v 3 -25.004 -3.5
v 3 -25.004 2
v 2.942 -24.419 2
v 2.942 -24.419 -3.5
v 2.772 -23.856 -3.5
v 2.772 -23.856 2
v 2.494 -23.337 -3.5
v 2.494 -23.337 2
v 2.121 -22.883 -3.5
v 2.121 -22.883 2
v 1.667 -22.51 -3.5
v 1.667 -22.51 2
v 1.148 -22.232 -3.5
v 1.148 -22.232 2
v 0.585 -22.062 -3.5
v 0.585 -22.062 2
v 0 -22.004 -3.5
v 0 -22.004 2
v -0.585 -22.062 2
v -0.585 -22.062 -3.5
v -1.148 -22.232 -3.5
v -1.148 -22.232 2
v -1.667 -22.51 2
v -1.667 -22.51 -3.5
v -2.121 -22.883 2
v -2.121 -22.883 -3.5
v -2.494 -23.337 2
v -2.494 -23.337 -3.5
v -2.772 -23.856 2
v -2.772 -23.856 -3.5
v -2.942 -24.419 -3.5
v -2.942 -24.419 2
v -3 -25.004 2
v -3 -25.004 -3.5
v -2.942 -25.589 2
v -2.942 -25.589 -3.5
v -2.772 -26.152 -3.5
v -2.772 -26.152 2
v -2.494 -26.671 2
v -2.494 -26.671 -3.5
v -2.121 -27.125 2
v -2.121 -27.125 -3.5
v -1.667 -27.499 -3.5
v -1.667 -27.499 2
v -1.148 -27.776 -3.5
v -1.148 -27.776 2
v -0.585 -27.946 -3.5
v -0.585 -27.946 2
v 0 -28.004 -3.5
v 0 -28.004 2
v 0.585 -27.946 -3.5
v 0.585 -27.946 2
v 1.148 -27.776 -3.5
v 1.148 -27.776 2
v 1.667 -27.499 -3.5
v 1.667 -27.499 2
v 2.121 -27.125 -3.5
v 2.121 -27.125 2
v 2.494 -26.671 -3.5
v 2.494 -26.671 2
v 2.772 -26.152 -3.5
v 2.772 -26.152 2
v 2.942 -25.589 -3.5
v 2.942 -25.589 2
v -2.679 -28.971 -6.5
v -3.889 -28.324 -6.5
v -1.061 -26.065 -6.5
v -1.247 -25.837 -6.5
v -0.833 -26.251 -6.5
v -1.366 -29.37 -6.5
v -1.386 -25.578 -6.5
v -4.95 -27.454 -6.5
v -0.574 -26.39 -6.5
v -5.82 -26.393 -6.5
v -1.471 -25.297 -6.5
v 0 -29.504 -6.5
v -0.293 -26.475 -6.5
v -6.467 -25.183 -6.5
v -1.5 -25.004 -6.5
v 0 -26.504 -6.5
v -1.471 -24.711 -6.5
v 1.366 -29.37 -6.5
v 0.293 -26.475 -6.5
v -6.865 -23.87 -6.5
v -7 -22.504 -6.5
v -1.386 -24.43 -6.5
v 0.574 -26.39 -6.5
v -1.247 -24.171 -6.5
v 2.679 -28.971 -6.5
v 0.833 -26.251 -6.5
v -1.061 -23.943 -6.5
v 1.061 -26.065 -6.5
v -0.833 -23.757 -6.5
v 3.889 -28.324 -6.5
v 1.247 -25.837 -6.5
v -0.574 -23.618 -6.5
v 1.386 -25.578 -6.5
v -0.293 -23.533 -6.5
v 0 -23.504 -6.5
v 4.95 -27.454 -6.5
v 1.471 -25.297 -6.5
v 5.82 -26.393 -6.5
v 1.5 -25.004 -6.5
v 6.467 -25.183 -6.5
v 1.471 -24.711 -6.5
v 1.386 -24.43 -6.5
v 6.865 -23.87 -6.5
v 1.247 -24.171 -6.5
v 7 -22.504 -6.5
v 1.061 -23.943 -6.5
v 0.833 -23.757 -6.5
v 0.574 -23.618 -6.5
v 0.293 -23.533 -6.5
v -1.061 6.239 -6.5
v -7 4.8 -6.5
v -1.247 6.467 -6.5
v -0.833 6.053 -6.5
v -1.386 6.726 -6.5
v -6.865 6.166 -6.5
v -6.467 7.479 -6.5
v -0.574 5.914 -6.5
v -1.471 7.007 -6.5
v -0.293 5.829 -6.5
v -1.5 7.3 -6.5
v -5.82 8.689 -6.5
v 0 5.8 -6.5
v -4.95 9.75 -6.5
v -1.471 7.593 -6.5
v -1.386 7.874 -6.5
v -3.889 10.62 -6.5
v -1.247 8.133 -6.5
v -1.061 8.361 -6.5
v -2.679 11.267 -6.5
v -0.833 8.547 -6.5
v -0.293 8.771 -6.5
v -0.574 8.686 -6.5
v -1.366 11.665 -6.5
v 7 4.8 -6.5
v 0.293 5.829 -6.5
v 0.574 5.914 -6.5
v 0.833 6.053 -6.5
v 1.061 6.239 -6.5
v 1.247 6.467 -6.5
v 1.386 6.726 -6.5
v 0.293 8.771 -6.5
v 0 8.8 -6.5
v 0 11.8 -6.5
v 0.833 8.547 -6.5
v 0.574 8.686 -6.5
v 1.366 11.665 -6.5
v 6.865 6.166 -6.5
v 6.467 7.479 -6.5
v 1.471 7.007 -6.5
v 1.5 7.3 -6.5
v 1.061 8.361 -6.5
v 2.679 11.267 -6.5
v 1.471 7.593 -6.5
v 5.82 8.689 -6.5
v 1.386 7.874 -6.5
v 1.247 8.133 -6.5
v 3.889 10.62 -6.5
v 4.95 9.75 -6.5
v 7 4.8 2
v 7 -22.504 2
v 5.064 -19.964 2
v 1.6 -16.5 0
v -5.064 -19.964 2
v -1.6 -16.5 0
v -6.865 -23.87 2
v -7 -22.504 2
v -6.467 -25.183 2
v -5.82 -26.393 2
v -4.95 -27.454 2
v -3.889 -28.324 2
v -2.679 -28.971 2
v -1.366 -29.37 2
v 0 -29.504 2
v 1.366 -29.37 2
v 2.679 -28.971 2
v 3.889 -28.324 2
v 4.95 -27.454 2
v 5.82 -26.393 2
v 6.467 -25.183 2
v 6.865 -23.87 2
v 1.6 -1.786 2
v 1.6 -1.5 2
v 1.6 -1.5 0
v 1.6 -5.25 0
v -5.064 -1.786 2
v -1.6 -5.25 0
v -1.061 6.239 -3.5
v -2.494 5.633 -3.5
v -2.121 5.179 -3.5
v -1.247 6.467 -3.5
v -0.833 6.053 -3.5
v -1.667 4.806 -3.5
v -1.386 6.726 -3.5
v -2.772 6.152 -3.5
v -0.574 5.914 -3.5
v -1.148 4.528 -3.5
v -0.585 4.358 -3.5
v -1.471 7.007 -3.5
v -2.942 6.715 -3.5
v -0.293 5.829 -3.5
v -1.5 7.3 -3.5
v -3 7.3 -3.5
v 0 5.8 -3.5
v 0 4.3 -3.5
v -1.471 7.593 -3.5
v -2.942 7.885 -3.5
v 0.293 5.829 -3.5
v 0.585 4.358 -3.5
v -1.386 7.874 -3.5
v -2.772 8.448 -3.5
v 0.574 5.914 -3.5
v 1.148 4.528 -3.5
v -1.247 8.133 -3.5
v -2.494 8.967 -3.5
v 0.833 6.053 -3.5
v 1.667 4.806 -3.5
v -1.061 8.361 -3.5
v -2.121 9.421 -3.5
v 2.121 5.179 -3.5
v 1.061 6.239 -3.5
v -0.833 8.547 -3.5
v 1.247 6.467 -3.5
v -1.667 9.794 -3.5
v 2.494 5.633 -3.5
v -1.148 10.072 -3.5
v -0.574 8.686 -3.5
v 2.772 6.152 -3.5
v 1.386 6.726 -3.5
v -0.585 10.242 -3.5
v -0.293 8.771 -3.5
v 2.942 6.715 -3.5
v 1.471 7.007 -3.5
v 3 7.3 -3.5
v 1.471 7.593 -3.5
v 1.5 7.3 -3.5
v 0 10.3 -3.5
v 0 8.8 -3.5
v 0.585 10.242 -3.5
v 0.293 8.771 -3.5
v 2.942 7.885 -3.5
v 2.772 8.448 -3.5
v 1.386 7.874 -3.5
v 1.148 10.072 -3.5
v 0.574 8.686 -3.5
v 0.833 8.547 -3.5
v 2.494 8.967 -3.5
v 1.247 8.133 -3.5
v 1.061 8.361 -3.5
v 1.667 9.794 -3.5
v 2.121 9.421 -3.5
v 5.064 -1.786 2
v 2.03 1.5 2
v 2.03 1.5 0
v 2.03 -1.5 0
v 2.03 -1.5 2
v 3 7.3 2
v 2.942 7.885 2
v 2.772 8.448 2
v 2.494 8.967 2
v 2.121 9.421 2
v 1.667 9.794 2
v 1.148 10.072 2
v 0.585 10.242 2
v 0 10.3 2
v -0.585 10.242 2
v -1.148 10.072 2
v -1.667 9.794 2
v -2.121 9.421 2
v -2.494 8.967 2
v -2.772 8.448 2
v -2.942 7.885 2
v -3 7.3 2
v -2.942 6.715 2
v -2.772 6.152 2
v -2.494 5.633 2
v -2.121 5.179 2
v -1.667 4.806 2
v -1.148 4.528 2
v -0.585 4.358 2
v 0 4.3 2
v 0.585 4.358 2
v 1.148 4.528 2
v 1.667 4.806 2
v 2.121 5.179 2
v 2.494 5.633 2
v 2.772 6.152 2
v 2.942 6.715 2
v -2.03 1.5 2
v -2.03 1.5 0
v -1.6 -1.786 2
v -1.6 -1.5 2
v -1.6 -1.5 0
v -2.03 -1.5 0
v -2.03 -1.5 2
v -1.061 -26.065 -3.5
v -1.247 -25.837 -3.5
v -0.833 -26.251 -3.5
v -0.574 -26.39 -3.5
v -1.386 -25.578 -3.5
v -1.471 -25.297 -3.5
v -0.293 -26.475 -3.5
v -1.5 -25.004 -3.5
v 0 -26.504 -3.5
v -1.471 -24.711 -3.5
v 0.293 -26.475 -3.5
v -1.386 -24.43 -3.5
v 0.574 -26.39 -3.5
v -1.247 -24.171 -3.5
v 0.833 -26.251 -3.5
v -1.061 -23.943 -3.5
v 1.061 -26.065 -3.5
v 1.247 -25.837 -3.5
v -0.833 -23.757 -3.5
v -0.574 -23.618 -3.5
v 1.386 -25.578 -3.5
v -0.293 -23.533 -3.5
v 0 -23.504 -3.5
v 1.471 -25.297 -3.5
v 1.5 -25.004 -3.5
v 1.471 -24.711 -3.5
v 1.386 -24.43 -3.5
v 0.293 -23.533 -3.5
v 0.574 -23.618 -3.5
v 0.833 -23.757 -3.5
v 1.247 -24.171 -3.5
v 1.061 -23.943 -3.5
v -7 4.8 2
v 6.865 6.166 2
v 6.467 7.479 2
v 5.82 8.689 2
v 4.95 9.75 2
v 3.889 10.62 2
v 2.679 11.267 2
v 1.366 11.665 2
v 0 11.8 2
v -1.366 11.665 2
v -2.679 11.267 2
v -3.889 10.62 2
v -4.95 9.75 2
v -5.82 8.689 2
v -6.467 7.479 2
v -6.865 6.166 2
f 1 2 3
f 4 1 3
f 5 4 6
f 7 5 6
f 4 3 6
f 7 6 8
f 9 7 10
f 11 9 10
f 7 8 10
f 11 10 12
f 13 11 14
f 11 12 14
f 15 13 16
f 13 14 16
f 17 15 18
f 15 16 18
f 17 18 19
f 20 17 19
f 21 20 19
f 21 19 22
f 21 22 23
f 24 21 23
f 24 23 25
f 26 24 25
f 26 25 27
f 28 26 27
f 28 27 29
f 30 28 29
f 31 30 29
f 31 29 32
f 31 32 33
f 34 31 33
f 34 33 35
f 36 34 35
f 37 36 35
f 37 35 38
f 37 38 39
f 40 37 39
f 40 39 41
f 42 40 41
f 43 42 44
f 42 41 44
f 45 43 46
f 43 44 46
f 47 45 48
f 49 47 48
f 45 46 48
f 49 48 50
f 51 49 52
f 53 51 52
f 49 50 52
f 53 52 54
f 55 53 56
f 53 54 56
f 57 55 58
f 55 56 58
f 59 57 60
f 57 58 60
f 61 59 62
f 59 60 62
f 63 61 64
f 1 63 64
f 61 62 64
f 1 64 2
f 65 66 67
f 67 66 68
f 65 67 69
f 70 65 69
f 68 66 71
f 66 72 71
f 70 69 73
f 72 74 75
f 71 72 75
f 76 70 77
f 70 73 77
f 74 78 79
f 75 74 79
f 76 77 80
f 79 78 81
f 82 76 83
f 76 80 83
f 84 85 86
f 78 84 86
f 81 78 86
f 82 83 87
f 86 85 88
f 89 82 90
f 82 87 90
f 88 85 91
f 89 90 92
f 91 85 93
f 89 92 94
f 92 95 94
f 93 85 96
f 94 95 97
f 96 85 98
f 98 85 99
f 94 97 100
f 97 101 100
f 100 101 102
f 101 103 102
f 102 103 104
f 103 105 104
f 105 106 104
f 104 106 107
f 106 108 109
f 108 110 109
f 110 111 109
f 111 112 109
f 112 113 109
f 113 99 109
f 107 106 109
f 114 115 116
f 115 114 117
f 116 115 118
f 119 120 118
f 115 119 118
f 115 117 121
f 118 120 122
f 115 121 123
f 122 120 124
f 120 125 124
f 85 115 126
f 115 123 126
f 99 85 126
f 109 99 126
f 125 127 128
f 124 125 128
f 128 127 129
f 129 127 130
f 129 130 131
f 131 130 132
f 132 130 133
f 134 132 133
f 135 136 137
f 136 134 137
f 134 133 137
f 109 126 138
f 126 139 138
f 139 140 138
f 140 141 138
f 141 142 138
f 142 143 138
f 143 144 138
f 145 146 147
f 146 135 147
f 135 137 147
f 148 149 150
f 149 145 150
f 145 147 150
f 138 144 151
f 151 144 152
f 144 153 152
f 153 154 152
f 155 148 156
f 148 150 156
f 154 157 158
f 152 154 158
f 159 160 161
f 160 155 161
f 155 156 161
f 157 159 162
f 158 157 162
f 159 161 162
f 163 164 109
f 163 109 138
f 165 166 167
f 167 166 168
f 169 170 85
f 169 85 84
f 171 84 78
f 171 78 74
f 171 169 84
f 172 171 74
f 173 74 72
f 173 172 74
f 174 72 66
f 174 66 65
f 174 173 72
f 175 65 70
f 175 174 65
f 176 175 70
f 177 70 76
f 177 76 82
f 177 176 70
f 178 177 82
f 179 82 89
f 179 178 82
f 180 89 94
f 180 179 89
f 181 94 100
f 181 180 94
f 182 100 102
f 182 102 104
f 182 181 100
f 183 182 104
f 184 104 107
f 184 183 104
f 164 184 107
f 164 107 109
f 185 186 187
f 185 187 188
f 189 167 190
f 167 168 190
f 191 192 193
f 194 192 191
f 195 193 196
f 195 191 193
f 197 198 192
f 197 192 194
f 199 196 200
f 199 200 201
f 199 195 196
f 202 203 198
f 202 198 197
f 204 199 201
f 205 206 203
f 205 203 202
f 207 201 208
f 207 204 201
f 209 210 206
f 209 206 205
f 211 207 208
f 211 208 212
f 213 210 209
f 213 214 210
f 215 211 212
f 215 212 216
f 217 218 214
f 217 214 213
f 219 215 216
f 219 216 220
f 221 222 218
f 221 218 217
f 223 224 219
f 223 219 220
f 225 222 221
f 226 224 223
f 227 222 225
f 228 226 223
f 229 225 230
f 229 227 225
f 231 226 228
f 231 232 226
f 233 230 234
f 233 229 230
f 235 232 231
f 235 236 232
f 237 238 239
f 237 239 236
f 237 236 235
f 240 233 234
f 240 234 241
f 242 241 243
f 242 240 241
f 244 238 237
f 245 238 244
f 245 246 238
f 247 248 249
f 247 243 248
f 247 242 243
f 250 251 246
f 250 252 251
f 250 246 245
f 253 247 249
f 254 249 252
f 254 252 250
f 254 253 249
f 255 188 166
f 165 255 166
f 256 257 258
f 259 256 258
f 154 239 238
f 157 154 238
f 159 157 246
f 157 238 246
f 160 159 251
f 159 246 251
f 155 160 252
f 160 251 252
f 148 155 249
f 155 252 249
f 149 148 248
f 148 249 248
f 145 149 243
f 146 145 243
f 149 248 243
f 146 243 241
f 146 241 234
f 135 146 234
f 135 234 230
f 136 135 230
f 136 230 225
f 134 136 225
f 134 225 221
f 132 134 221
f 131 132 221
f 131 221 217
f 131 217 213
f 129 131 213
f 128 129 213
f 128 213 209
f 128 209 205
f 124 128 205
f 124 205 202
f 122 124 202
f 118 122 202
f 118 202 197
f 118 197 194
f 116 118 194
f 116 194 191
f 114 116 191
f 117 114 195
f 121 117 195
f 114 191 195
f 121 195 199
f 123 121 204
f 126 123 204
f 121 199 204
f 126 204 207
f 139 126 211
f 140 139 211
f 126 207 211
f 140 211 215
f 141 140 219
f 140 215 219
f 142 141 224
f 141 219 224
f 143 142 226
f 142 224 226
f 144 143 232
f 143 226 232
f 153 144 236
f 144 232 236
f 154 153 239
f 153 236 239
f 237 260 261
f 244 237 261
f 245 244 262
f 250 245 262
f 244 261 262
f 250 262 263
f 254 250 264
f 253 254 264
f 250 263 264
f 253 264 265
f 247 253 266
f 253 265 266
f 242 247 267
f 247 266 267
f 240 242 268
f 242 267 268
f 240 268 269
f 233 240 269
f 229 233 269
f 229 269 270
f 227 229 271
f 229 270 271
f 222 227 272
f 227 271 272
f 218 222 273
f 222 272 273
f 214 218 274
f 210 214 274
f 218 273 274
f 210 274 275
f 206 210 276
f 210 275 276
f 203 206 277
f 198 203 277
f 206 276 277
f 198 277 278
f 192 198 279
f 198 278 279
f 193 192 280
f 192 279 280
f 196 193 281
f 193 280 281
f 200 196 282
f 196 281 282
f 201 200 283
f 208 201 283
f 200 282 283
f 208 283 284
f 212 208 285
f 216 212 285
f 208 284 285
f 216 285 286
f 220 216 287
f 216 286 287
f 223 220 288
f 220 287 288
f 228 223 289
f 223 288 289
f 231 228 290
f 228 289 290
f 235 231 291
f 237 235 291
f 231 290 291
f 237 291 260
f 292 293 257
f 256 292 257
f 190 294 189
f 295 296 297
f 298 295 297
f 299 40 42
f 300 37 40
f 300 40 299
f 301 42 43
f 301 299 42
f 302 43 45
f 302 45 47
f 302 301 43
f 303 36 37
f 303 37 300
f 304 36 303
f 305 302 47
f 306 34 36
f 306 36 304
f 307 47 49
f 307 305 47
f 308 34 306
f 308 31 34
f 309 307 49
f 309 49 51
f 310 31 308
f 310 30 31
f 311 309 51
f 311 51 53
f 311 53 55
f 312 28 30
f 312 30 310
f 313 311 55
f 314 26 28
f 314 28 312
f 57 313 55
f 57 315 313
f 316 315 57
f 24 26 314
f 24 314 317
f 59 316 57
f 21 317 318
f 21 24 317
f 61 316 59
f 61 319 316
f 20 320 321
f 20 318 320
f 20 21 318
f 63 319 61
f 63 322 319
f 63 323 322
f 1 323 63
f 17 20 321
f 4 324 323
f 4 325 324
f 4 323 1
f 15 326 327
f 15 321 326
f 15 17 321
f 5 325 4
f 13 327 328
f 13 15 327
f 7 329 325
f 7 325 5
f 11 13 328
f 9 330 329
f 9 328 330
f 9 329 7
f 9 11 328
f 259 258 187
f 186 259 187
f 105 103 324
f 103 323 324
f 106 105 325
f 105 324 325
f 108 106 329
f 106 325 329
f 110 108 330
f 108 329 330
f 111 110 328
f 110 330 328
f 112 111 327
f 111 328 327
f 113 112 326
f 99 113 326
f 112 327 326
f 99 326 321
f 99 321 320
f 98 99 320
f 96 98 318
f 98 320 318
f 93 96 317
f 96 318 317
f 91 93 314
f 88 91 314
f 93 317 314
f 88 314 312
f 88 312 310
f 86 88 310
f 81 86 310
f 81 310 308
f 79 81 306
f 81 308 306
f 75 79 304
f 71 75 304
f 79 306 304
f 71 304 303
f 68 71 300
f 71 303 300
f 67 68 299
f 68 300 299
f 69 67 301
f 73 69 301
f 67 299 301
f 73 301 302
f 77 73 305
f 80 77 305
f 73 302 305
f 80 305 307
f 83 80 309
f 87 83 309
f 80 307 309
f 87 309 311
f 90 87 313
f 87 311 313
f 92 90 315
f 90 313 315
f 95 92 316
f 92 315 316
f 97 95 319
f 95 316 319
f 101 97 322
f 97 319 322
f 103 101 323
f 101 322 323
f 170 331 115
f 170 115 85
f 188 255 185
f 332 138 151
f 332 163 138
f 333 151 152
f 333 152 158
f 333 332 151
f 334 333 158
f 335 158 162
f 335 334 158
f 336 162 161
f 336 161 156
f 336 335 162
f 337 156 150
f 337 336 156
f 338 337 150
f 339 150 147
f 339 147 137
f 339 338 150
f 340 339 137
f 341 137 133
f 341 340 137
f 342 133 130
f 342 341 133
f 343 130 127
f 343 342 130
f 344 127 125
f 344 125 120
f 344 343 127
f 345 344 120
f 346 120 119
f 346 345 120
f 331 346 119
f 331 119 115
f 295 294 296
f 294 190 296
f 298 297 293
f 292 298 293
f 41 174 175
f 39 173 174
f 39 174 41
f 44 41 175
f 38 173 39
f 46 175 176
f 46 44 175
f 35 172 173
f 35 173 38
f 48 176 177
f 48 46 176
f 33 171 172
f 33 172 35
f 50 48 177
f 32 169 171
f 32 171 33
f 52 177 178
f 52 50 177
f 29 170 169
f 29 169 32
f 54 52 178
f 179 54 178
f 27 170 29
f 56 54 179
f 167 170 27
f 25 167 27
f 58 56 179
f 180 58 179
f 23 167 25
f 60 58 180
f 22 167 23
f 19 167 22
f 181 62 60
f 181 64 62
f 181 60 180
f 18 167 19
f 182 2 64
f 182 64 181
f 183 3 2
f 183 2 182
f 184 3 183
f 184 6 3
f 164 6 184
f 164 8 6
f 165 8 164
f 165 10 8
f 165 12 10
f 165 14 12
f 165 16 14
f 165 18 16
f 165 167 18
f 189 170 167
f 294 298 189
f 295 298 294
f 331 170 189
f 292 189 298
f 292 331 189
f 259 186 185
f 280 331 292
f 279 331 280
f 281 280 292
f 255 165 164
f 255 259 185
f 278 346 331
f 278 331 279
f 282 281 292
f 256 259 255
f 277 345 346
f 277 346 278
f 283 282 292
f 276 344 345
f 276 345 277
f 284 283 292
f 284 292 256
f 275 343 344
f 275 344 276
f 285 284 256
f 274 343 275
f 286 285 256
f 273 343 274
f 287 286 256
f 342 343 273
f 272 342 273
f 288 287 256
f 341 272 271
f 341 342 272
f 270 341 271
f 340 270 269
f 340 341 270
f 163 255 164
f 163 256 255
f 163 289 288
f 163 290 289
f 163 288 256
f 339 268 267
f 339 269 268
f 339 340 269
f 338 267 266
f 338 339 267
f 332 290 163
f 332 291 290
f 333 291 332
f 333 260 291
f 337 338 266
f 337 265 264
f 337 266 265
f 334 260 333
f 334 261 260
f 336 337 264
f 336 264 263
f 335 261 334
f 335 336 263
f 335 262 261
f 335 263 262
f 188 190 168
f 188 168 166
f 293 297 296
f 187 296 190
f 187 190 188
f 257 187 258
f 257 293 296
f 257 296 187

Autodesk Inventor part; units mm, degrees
ref_plane "YZ Plane" through (0, 0, 0) normal (1, 0, 0) x (0, 1, 0)
ref_plane "XZ Plane" through (0, 0, 0) normal (0, 1, 0) x (-1, 0, 0)
ref_plane "XY Plane" through (0, 0, 0) normal (0, 0, 1) x (1, 0, 0)
sketch "Эскиз1" plane through (0, 0, 0) normal (0, 0, 1) x (1, 0, 0)
  line L0 (-2.03, 1.5) -> (2.03, 1.5)
  line L1 (2.03, 1.5) -> (2.03, -1.5)
  line L2 (2.03, -1.5) -> (-2.03, -1.5)
  line L3 (-2.03, -1.5) -> (-2.03, 1.5)
  line L4 (-2.03, 1.5) -> (2.03, -1.5) construction
  line L5 (2.03, 1.5) -> (-2.03, -1.5) construction
  line L6 (-1.6, -1.5) -> (1.6, -1.5)
  line L7 (1.6, -1.5) -> (1.6, -16.5)
  line L8 (1.6, -16.5) -> (-1.6, -16.5)
  line L9 (-1.6, -16.5) -> (-1.6, -1.5)
  line L10 (0, 4.8) -> (0, -22.5041) construction
  line L11 (-7, 4.8) -> (-7, -22.5041)
  line L12 (7, -22.5041) -> (7, 4.8)
  arc A0 (7, 4.8) -> (-7, 4.8) centre (0, 4.8) ccw
  arc A1 (-7, -22.5041) -> (7, -22.5041) centre (0, -22.5041) ccw
  line L13 (-1.6, -1.5) -> (-1.6, -9)
  line L14 (1.6, -1.5) -> (1.6, -9)
  line L15 (-1.6, -5.25) -> (-5.6947, -16.5)
  line L16 (1.6, -5.25) -> (5.6947, -16.5)
  arc A2 (-5.6947, -16.5) -> (5.6947, -16.5) centre (0, -0.854) ccw
  line L17 (1.6, -5.25) -> (-1.6, -5.25)
  circle A3 centre (0, -25.0041) radius 1.5
  circle A4 centre (0, 7.3) radius 1.5
  point P0 (0, 0)
  point P1 (0, 0)
  point P2 (0, 0)
  point P3 (0, 0)
  point P4 (0, -1.5)
  point P5 (0, 0)
  point P6 (0, -8.8521)
  point P7 (1.6, -5.25)
  point P8 (-1.6, -5.25)
  point P9 (1.6, -1.5)
  dimension "d0" = 4.06
  dimension "d1" = 3
  dimension "d2" = 3.2
  dimension "d3" = 15
  dimension "d4" = 14
  dimension "d5" = 20
  dimension "d6" = 20
  dimension "d15" = 3
  dimension "d16" = 3
  dimension "d17" = 3
  dimension "d18" = 3
  dimension "d20" = 6
  dimension "d24" = 16.1521
extrude "Выдавливание1" add sketch "Эскиз1" along normal blind 2 and the other way blind 6.5 contours L0 L1 L2 L3 | L2 L7 L17 L9 | L17 L7 L8 L9 | L9 L8 L7 L16 A2 L15 | A0 L12 A1 L11
extrude "Выдавливание2" cut sketch "Эскиз1" along normal up to surface (2 mm away) draft 60 contours L17 L7 L8 L9
extrude "Выдавливание3" cut sketch "Эскиз1" along normal up to surface (2 mm away) contours L0 L1 L2 L3 | L2 L7 L17 L9
sketch "Эскиз2" plane through (0, 0, 2) normal (0, 0, 1) x (1, 0, 0)
  circle A0 centre (0, 7.3) radius 1.5 projected
  circle A1 centre (0, -25.0041) radius 1.5 projected
  circle A2 centre (0, 7.3) radius 3
  circle A3 centre (0, -25.0041) radius 3
  point P0 (0, 0)
  dimension "d21" = 6
extrude "Выдавливание4" cut sketch "Эскиз2" against normal blind 5.5 contours A0 | A1 | A2 | A3
properties part number "Установка датчика холла"
